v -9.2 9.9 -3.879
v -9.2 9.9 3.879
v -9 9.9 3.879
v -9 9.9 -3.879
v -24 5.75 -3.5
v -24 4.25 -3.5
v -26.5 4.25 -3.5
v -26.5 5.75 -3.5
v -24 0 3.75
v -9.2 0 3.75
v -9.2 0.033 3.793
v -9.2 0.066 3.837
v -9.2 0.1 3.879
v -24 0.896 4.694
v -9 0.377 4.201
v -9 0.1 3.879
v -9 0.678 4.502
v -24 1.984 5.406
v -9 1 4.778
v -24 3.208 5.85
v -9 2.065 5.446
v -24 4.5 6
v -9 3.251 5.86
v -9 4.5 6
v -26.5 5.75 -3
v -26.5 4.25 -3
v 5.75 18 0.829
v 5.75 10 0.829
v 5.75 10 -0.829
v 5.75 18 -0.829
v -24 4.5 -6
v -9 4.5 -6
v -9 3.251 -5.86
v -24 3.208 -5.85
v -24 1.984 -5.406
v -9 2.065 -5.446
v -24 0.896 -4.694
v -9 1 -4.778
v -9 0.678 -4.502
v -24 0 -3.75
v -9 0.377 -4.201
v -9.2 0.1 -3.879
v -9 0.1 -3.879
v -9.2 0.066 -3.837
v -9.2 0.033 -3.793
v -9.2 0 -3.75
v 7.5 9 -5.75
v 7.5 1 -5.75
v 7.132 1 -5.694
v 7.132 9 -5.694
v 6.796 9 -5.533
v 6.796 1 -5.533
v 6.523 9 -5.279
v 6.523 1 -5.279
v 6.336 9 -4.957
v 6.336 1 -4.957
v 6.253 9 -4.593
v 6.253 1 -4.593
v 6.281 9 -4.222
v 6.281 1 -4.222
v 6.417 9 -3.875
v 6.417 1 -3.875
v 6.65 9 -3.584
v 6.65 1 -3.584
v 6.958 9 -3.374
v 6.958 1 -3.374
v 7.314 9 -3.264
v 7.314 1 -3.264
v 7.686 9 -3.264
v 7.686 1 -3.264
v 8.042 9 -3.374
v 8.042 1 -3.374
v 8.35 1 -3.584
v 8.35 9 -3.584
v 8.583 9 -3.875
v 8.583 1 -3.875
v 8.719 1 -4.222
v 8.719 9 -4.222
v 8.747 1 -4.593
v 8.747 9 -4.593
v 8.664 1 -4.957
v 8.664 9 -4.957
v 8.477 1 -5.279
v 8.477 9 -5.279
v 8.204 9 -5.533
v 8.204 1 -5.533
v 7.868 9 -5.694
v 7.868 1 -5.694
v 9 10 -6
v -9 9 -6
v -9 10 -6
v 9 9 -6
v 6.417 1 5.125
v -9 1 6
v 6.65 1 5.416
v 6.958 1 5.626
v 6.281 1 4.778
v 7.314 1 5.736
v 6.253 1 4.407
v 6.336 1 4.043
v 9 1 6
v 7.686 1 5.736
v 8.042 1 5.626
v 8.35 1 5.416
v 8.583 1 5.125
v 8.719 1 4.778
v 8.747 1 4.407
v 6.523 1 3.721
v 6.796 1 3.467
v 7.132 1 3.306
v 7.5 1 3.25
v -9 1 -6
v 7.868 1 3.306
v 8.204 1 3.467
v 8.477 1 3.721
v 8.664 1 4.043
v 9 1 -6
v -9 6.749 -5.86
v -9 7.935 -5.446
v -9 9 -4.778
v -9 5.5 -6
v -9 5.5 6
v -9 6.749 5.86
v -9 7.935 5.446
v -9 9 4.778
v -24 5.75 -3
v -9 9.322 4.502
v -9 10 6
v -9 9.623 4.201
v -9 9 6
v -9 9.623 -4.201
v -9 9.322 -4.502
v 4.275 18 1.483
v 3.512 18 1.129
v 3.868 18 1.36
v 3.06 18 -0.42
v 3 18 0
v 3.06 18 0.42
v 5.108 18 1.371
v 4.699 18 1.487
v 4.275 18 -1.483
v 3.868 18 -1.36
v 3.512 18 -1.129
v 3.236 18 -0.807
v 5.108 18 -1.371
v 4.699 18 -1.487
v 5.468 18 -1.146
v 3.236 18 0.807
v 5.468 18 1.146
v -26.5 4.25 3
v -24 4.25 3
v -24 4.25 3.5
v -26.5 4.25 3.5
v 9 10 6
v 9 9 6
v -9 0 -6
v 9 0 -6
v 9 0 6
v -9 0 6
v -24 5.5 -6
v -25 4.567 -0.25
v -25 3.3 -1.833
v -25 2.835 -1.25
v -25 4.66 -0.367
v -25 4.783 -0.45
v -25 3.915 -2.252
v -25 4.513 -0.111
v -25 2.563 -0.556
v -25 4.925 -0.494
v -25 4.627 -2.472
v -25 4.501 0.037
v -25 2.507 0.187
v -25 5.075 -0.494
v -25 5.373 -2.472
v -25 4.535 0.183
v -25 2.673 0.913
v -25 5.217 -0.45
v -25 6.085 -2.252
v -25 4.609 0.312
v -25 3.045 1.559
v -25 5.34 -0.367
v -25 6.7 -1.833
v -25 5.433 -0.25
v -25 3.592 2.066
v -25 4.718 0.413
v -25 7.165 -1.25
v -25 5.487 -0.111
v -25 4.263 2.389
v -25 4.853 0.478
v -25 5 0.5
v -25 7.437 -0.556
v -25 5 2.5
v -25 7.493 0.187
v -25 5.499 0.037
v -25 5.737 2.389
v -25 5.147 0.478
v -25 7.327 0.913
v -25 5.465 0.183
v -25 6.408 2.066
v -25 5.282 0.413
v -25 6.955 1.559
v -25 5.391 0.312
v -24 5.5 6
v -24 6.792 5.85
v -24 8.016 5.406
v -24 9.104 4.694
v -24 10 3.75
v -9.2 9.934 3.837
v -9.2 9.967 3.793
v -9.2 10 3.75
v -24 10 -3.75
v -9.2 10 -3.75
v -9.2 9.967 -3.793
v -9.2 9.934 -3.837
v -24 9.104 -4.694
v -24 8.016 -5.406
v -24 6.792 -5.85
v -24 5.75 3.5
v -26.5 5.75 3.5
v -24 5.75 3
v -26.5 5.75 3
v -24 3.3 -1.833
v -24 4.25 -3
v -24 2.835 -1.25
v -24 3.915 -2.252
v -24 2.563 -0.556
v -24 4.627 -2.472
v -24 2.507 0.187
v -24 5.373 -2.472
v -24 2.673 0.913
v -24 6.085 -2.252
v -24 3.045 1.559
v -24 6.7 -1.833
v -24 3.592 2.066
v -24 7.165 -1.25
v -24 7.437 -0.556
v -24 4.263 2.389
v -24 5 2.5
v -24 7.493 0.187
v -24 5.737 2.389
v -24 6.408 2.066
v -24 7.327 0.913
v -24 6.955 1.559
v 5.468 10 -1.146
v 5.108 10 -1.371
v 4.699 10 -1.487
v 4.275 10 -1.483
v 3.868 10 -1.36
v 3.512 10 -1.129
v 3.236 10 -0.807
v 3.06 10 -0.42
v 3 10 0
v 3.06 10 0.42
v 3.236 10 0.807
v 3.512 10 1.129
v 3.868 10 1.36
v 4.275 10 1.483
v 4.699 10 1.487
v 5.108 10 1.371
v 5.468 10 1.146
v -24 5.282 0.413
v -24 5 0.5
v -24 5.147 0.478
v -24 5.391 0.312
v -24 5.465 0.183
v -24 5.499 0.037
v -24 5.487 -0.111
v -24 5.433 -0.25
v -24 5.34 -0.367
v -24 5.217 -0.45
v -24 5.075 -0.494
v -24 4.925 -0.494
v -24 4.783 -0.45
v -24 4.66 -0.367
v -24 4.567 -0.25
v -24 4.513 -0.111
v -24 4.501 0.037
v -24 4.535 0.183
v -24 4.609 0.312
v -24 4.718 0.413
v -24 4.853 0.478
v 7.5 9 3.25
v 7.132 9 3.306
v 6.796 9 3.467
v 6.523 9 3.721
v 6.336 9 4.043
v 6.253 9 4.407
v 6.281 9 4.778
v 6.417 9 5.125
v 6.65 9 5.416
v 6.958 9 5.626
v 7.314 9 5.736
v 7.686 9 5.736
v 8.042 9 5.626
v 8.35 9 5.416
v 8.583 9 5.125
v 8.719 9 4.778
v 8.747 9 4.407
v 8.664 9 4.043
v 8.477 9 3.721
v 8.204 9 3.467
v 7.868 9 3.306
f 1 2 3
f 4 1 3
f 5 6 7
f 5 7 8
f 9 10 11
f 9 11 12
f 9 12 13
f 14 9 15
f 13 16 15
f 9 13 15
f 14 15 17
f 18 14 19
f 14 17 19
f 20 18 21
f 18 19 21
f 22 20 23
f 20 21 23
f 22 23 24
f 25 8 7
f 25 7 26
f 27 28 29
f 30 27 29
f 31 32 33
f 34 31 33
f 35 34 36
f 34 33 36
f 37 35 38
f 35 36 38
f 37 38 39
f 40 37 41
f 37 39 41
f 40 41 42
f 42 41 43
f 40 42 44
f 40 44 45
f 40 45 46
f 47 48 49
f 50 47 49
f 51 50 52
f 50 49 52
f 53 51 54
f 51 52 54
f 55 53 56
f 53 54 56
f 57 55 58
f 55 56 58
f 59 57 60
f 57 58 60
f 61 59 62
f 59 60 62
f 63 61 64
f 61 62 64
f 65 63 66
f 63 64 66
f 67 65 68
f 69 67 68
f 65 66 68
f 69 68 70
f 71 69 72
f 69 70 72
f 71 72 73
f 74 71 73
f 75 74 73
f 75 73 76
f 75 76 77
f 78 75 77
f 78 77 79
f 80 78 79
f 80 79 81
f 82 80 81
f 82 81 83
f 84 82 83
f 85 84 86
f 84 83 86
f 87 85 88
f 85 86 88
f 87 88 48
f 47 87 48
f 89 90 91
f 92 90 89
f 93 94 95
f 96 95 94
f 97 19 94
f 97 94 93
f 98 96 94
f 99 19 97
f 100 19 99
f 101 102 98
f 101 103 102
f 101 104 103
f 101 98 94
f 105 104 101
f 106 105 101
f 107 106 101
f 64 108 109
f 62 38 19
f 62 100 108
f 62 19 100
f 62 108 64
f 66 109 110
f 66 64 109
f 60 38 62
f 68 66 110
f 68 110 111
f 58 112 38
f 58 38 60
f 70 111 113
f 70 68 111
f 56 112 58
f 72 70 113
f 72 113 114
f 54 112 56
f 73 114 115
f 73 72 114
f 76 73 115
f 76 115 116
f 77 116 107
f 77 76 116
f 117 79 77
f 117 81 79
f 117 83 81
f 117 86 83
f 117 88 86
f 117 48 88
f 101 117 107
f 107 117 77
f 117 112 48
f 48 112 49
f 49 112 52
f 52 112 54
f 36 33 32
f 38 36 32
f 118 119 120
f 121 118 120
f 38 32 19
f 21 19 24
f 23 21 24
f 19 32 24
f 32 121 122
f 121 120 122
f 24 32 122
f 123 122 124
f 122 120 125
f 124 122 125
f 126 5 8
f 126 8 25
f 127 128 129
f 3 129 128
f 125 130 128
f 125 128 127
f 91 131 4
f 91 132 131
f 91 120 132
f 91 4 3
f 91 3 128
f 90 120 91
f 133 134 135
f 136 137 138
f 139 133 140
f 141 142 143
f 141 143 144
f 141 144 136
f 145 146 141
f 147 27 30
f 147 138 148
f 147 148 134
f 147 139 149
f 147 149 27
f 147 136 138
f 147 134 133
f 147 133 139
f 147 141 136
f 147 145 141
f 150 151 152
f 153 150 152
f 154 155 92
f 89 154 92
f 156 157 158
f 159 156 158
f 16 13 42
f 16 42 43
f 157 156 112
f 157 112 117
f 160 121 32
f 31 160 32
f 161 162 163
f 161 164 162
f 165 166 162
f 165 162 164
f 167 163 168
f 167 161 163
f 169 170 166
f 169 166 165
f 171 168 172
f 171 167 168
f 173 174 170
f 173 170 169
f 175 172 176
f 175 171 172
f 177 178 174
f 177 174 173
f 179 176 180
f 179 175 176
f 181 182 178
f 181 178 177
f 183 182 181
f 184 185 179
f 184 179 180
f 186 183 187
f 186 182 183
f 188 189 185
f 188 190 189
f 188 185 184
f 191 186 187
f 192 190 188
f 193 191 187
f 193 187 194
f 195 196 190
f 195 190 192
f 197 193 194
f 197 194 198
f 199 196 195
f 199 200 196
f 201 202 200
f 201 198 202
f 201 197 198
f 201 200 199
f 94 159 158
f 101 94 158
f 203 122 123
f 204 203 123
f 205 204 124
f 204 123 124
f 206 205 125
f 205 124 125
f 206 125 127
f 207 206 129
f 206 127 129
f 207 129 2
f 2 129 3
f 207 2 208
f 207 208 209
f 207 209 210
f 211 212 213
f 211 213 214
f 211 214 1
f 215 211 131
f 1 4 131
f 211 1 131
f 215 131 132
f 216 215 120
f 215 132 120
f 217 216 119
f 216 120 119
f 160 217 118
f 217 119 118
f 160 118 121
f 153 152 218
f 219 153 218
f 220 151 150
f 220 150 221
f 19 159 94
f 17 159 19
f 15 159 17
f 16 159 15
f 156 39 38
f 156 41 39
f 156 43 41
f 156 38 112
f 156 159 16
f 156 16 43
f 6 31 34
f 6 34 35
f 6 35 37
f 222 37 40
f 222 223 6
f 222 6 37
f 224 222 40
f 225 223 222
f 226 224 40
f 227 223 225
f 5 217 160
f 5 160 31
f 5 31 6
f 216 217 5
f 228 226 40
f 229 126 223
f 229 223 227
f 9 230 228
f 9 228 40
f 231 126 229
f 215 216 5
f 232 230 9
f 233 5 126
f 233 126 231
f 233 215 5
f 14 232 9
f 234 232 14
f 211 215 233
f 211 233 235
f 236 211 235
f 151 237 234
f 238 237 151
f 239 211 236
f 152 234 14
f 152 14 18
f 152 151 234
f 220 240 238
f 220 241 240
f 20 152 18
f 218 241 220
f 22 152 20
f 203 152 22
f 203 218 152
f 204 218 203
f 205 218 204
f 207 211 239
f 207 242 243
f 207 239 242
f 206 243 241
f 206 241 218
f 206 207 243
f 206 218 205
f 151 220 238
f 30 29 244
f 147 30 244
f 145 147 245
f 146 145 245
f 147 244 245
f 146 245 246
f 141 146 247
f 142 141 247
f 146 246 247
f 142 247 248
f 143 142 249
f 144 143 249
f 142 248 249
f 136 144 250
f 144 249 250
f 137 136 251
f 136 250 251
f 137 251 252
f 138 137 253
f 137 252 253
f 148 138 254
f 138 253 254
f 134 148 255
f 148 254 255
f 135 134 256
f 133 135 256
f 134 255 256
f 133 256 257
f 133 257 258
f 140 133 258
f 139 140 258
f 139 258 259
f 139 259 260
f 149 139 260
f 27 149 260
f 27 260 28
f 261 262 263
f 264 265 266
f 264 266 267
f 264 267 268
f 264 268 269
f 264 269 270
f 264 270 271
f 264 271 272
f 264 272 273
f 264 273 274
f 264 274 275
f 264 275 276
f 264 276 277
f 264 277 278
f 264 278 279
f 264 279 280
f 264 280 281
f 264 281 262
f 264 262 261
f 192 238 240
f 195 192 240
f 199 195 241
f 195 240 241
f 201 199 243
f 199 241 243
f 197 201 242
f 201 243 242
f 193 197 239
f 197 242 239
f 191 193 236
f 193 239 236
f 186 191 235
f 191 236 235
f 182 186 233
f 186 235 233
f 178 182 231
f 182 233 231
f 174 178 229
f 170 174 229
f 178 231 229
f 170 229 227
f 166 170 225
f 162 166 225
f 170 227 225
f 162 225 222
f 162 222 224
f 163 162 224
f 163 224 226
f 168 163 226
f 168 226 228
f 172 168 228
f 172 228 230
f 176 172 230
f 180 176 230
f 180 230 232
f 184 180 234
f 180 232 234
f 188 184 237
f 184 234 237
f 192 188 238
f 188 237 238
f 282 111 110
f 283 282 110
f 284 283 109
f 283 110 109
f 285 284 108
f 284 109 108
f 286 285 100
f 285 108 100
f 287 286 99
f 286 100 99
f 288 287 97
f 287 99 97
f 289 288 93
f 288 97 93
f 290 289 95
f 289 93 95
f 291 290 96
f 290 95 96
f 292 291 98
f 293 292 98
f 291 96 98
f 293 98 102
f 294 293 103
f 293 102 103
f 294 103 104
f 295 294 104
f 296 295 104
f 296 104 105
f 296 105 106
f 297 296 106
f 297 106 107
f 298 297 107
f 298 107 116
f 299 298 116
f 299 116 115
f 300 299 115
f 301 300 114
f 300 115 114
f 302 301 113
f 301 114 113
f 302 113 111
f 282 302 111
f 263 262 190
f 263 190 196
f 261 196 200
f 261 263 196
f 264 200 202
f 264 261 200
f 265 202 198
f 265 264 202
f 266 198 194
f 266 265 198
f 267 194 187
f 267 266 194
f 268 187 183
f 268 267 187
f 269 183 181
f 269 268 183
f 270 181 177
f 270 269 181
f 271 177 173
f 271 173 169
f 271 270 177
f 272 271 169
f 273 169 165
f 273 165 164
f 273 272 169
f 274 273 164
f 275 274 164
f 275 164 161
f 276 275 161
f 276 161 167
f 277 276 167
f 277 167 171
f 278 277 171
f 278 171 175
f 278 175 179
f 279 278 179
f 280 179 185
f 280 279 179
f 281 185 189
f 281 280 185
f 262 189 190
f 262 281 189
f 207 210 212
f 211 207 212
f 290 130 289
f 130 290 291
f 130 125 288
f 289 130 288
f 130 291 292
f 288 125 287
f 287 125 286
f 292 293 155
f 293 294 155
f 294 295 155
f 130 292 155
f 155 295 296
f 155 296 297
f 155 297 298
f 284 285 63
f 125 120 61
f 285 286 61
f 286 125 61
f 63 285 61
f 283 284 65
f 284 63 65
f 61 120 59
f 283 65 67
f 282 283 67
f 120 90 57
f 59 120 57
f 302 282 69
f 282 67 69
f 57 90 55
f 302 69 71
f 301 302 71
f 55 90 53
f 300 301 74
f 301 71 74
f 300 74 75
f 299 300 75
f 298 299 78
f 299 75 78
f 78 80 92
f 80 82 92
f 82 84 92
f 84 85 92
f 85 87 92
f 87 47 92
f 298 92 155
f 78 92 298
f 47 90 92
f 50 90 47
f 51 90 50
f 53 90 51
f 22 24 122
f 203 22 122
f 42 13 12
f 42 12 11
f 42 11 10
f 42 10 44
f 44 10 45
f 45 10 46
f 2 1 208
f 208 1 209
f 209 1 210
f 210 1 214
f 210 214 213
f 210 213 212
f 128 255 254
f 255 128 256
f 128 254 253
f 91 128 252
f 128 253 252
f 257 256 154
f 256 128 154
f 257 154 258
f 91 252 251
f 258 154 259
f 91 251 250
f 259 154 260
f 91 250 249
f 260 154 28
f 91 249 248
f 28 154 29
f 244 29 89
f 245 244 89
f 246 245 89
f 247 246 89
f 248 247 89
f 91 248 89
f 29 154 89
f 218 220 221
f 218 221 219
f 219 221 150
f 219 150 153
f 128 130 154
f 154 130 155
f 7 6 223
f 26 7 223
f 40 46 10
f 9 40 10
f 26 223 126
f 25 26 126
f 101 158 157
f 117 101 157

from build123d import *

# Parameters (mm, degrees)
SKETCH1_W           = 18
SKETCH1_H           = 12
BOSS_EXTRUDE1_DEPTH = 1
SKETCH2_R           = 1.25
BOSS_EXTRUDE2_DEPTH = 8
SKETCH3_W           = 18
SKETCH3_H           = 12
BOSS_EXTRUDE3_DEPTH = 1
BOSS_EXTRUDE4_DEPTH = 15
SKETCH5_R           = 2.5
SKETCH5_R_2         = 0.5
BOSS_EXTRUDE5_DEPTH = 1
SKETCH6_W           = 0.5
SKETCH6_H           = 1.5
BOSS_EXTRUDE6_DEPTH = 2.5
BOSS_EXTRUDE7_DEPTH = 8
SKETCH8_W           = 0.2
SKETCH8_H           = 0.1
CUT_EXTRUDE1_DEPTH  = 35.208916966


with BuildPart() as part:
    # Sketch1 → Boss-Extrude1 (new body)
    with BuildSketch(Plane(origin=(0, 0, 0), x_dir=(1, 0, 0), z_dir=(0, 1, 0))):
        Rectangle(SKETCH1_W, SKETCH1_H)
    extrude(amount=BOSS_EXTRUDE1_DEPTH)

    # Sketch2 → Boss-Extrude2 (add)
    with BuildSketch(Plane(origin=(0, 1, 0), x_dir=(1, 0, 0), z_dir=(0, 1, 0))):
        with Locations(Location((7.5, 4.5, 0), (0, 0, 90))):
            Circle(SKETCH2_R)
        with Locations(Location((7.5, -4.5, 0), (0, 0, 90))):
            Circle(SKETCH2_R)
    extrude(amount=BOSS_EXTRUDE2_DEPTH)

    # Sketch3 → Boss-Extrude3 (add)
    with BuildSketch(Plane(origin=(0, 9, 0), x_dir=(1, 0, 0), z_dir=(0, 1, 0))):
        Rectangle(SKETCH3_W, SKETCH3_H)
    extrude(amount=BOSS_EXTRUDE3_DEPTH)

    # Sketch4 → Boss-Extrude4 (add)
    with BuildSketch(Plane.ZY.offset(9)):
        with BuildLine():
            Line((-3.75, 0), (3.75, 0))
            ThreePointArc((3.75, 0), (5.406152949, 1.984423525), (6, 4.5))
            Line((6, 4.5), (6, 5.5))
            ThreePointArc((6, 5.5), (5.406152949, 8.015576475), (3.75, 10))
            Line((3.75, 10), (-3.75, 10))
            ThreePointArc((-3.75, 10), (-5.406152949, 8.015576475), (-6, 5.5))
            Line((-6, 5.5), (-6, 4.5))
            ThreePointArc((-6, 4.5), (-5.406152949, 1.984423525), (-3.75, 0))
        make_face()
    extrude(amount=BOSS_EXTRUDE4_DEPTH)

    # Sketch5 → Boss-Extrude5 (add)
    with BuildSketch(Plane.ZY.offset(24)):
        with Locations((0, 5)):
            Circle(SKETCH5_R)
        with Locations((0, 5)):
            Circle(SKETCH5_R_2, mode=Mode.SUBTRACT)
    extrude(amount=BOSS_EXTRUDE5_DEPTH)

    # Sketch6 → Boss-Extrude6 (add)
    with BuildSketch(Plane.ZY.offset(24)):
        with Locations((-3.25, 5)):
            Rectangle(SKETCH6_W, SKETCH6_H)
        with Locations((3.25, 5)):
            Rectangle(SKETCH6_W, SKETCH6_H)
    extrude(amount=BOSS_EXTRUDE6_DEPTH)

    # Sketch7 → Boss-Extrude7 (add)
    with BuildSketch(Plane(origin=(0, 10, 0), x_dir=(1, 0, 0), z_dir=(0, 1, 0))):
        with BuildLine():
            Line((5.75, -0.829156198), (5.75, 0.829156198))
            ThreePointArc((5.75, 0.829156198), (3, 0), (5.75, -0.829156198))
        make_face()
    extrude(amount=BOSS_EXTRUDE7_DEPTH)

    # Sketch8 → Cut-Extrude1 (cut, through all)
    with BuildSketch(Plane.XY.offset(6)):
        with Locations((-9.1, 9.95)):
            Rectangle(SKETCH8_W, SKETCH8_H)
        with Locations((-9.1, 0.05)):
            Rectangle(SKETCH8_W, SKETCH8_H)
    extrude(amount=-CUT_EXTRUDE1_DEPTH, mode=Mode.SUBTRACT)


solid = part.part
